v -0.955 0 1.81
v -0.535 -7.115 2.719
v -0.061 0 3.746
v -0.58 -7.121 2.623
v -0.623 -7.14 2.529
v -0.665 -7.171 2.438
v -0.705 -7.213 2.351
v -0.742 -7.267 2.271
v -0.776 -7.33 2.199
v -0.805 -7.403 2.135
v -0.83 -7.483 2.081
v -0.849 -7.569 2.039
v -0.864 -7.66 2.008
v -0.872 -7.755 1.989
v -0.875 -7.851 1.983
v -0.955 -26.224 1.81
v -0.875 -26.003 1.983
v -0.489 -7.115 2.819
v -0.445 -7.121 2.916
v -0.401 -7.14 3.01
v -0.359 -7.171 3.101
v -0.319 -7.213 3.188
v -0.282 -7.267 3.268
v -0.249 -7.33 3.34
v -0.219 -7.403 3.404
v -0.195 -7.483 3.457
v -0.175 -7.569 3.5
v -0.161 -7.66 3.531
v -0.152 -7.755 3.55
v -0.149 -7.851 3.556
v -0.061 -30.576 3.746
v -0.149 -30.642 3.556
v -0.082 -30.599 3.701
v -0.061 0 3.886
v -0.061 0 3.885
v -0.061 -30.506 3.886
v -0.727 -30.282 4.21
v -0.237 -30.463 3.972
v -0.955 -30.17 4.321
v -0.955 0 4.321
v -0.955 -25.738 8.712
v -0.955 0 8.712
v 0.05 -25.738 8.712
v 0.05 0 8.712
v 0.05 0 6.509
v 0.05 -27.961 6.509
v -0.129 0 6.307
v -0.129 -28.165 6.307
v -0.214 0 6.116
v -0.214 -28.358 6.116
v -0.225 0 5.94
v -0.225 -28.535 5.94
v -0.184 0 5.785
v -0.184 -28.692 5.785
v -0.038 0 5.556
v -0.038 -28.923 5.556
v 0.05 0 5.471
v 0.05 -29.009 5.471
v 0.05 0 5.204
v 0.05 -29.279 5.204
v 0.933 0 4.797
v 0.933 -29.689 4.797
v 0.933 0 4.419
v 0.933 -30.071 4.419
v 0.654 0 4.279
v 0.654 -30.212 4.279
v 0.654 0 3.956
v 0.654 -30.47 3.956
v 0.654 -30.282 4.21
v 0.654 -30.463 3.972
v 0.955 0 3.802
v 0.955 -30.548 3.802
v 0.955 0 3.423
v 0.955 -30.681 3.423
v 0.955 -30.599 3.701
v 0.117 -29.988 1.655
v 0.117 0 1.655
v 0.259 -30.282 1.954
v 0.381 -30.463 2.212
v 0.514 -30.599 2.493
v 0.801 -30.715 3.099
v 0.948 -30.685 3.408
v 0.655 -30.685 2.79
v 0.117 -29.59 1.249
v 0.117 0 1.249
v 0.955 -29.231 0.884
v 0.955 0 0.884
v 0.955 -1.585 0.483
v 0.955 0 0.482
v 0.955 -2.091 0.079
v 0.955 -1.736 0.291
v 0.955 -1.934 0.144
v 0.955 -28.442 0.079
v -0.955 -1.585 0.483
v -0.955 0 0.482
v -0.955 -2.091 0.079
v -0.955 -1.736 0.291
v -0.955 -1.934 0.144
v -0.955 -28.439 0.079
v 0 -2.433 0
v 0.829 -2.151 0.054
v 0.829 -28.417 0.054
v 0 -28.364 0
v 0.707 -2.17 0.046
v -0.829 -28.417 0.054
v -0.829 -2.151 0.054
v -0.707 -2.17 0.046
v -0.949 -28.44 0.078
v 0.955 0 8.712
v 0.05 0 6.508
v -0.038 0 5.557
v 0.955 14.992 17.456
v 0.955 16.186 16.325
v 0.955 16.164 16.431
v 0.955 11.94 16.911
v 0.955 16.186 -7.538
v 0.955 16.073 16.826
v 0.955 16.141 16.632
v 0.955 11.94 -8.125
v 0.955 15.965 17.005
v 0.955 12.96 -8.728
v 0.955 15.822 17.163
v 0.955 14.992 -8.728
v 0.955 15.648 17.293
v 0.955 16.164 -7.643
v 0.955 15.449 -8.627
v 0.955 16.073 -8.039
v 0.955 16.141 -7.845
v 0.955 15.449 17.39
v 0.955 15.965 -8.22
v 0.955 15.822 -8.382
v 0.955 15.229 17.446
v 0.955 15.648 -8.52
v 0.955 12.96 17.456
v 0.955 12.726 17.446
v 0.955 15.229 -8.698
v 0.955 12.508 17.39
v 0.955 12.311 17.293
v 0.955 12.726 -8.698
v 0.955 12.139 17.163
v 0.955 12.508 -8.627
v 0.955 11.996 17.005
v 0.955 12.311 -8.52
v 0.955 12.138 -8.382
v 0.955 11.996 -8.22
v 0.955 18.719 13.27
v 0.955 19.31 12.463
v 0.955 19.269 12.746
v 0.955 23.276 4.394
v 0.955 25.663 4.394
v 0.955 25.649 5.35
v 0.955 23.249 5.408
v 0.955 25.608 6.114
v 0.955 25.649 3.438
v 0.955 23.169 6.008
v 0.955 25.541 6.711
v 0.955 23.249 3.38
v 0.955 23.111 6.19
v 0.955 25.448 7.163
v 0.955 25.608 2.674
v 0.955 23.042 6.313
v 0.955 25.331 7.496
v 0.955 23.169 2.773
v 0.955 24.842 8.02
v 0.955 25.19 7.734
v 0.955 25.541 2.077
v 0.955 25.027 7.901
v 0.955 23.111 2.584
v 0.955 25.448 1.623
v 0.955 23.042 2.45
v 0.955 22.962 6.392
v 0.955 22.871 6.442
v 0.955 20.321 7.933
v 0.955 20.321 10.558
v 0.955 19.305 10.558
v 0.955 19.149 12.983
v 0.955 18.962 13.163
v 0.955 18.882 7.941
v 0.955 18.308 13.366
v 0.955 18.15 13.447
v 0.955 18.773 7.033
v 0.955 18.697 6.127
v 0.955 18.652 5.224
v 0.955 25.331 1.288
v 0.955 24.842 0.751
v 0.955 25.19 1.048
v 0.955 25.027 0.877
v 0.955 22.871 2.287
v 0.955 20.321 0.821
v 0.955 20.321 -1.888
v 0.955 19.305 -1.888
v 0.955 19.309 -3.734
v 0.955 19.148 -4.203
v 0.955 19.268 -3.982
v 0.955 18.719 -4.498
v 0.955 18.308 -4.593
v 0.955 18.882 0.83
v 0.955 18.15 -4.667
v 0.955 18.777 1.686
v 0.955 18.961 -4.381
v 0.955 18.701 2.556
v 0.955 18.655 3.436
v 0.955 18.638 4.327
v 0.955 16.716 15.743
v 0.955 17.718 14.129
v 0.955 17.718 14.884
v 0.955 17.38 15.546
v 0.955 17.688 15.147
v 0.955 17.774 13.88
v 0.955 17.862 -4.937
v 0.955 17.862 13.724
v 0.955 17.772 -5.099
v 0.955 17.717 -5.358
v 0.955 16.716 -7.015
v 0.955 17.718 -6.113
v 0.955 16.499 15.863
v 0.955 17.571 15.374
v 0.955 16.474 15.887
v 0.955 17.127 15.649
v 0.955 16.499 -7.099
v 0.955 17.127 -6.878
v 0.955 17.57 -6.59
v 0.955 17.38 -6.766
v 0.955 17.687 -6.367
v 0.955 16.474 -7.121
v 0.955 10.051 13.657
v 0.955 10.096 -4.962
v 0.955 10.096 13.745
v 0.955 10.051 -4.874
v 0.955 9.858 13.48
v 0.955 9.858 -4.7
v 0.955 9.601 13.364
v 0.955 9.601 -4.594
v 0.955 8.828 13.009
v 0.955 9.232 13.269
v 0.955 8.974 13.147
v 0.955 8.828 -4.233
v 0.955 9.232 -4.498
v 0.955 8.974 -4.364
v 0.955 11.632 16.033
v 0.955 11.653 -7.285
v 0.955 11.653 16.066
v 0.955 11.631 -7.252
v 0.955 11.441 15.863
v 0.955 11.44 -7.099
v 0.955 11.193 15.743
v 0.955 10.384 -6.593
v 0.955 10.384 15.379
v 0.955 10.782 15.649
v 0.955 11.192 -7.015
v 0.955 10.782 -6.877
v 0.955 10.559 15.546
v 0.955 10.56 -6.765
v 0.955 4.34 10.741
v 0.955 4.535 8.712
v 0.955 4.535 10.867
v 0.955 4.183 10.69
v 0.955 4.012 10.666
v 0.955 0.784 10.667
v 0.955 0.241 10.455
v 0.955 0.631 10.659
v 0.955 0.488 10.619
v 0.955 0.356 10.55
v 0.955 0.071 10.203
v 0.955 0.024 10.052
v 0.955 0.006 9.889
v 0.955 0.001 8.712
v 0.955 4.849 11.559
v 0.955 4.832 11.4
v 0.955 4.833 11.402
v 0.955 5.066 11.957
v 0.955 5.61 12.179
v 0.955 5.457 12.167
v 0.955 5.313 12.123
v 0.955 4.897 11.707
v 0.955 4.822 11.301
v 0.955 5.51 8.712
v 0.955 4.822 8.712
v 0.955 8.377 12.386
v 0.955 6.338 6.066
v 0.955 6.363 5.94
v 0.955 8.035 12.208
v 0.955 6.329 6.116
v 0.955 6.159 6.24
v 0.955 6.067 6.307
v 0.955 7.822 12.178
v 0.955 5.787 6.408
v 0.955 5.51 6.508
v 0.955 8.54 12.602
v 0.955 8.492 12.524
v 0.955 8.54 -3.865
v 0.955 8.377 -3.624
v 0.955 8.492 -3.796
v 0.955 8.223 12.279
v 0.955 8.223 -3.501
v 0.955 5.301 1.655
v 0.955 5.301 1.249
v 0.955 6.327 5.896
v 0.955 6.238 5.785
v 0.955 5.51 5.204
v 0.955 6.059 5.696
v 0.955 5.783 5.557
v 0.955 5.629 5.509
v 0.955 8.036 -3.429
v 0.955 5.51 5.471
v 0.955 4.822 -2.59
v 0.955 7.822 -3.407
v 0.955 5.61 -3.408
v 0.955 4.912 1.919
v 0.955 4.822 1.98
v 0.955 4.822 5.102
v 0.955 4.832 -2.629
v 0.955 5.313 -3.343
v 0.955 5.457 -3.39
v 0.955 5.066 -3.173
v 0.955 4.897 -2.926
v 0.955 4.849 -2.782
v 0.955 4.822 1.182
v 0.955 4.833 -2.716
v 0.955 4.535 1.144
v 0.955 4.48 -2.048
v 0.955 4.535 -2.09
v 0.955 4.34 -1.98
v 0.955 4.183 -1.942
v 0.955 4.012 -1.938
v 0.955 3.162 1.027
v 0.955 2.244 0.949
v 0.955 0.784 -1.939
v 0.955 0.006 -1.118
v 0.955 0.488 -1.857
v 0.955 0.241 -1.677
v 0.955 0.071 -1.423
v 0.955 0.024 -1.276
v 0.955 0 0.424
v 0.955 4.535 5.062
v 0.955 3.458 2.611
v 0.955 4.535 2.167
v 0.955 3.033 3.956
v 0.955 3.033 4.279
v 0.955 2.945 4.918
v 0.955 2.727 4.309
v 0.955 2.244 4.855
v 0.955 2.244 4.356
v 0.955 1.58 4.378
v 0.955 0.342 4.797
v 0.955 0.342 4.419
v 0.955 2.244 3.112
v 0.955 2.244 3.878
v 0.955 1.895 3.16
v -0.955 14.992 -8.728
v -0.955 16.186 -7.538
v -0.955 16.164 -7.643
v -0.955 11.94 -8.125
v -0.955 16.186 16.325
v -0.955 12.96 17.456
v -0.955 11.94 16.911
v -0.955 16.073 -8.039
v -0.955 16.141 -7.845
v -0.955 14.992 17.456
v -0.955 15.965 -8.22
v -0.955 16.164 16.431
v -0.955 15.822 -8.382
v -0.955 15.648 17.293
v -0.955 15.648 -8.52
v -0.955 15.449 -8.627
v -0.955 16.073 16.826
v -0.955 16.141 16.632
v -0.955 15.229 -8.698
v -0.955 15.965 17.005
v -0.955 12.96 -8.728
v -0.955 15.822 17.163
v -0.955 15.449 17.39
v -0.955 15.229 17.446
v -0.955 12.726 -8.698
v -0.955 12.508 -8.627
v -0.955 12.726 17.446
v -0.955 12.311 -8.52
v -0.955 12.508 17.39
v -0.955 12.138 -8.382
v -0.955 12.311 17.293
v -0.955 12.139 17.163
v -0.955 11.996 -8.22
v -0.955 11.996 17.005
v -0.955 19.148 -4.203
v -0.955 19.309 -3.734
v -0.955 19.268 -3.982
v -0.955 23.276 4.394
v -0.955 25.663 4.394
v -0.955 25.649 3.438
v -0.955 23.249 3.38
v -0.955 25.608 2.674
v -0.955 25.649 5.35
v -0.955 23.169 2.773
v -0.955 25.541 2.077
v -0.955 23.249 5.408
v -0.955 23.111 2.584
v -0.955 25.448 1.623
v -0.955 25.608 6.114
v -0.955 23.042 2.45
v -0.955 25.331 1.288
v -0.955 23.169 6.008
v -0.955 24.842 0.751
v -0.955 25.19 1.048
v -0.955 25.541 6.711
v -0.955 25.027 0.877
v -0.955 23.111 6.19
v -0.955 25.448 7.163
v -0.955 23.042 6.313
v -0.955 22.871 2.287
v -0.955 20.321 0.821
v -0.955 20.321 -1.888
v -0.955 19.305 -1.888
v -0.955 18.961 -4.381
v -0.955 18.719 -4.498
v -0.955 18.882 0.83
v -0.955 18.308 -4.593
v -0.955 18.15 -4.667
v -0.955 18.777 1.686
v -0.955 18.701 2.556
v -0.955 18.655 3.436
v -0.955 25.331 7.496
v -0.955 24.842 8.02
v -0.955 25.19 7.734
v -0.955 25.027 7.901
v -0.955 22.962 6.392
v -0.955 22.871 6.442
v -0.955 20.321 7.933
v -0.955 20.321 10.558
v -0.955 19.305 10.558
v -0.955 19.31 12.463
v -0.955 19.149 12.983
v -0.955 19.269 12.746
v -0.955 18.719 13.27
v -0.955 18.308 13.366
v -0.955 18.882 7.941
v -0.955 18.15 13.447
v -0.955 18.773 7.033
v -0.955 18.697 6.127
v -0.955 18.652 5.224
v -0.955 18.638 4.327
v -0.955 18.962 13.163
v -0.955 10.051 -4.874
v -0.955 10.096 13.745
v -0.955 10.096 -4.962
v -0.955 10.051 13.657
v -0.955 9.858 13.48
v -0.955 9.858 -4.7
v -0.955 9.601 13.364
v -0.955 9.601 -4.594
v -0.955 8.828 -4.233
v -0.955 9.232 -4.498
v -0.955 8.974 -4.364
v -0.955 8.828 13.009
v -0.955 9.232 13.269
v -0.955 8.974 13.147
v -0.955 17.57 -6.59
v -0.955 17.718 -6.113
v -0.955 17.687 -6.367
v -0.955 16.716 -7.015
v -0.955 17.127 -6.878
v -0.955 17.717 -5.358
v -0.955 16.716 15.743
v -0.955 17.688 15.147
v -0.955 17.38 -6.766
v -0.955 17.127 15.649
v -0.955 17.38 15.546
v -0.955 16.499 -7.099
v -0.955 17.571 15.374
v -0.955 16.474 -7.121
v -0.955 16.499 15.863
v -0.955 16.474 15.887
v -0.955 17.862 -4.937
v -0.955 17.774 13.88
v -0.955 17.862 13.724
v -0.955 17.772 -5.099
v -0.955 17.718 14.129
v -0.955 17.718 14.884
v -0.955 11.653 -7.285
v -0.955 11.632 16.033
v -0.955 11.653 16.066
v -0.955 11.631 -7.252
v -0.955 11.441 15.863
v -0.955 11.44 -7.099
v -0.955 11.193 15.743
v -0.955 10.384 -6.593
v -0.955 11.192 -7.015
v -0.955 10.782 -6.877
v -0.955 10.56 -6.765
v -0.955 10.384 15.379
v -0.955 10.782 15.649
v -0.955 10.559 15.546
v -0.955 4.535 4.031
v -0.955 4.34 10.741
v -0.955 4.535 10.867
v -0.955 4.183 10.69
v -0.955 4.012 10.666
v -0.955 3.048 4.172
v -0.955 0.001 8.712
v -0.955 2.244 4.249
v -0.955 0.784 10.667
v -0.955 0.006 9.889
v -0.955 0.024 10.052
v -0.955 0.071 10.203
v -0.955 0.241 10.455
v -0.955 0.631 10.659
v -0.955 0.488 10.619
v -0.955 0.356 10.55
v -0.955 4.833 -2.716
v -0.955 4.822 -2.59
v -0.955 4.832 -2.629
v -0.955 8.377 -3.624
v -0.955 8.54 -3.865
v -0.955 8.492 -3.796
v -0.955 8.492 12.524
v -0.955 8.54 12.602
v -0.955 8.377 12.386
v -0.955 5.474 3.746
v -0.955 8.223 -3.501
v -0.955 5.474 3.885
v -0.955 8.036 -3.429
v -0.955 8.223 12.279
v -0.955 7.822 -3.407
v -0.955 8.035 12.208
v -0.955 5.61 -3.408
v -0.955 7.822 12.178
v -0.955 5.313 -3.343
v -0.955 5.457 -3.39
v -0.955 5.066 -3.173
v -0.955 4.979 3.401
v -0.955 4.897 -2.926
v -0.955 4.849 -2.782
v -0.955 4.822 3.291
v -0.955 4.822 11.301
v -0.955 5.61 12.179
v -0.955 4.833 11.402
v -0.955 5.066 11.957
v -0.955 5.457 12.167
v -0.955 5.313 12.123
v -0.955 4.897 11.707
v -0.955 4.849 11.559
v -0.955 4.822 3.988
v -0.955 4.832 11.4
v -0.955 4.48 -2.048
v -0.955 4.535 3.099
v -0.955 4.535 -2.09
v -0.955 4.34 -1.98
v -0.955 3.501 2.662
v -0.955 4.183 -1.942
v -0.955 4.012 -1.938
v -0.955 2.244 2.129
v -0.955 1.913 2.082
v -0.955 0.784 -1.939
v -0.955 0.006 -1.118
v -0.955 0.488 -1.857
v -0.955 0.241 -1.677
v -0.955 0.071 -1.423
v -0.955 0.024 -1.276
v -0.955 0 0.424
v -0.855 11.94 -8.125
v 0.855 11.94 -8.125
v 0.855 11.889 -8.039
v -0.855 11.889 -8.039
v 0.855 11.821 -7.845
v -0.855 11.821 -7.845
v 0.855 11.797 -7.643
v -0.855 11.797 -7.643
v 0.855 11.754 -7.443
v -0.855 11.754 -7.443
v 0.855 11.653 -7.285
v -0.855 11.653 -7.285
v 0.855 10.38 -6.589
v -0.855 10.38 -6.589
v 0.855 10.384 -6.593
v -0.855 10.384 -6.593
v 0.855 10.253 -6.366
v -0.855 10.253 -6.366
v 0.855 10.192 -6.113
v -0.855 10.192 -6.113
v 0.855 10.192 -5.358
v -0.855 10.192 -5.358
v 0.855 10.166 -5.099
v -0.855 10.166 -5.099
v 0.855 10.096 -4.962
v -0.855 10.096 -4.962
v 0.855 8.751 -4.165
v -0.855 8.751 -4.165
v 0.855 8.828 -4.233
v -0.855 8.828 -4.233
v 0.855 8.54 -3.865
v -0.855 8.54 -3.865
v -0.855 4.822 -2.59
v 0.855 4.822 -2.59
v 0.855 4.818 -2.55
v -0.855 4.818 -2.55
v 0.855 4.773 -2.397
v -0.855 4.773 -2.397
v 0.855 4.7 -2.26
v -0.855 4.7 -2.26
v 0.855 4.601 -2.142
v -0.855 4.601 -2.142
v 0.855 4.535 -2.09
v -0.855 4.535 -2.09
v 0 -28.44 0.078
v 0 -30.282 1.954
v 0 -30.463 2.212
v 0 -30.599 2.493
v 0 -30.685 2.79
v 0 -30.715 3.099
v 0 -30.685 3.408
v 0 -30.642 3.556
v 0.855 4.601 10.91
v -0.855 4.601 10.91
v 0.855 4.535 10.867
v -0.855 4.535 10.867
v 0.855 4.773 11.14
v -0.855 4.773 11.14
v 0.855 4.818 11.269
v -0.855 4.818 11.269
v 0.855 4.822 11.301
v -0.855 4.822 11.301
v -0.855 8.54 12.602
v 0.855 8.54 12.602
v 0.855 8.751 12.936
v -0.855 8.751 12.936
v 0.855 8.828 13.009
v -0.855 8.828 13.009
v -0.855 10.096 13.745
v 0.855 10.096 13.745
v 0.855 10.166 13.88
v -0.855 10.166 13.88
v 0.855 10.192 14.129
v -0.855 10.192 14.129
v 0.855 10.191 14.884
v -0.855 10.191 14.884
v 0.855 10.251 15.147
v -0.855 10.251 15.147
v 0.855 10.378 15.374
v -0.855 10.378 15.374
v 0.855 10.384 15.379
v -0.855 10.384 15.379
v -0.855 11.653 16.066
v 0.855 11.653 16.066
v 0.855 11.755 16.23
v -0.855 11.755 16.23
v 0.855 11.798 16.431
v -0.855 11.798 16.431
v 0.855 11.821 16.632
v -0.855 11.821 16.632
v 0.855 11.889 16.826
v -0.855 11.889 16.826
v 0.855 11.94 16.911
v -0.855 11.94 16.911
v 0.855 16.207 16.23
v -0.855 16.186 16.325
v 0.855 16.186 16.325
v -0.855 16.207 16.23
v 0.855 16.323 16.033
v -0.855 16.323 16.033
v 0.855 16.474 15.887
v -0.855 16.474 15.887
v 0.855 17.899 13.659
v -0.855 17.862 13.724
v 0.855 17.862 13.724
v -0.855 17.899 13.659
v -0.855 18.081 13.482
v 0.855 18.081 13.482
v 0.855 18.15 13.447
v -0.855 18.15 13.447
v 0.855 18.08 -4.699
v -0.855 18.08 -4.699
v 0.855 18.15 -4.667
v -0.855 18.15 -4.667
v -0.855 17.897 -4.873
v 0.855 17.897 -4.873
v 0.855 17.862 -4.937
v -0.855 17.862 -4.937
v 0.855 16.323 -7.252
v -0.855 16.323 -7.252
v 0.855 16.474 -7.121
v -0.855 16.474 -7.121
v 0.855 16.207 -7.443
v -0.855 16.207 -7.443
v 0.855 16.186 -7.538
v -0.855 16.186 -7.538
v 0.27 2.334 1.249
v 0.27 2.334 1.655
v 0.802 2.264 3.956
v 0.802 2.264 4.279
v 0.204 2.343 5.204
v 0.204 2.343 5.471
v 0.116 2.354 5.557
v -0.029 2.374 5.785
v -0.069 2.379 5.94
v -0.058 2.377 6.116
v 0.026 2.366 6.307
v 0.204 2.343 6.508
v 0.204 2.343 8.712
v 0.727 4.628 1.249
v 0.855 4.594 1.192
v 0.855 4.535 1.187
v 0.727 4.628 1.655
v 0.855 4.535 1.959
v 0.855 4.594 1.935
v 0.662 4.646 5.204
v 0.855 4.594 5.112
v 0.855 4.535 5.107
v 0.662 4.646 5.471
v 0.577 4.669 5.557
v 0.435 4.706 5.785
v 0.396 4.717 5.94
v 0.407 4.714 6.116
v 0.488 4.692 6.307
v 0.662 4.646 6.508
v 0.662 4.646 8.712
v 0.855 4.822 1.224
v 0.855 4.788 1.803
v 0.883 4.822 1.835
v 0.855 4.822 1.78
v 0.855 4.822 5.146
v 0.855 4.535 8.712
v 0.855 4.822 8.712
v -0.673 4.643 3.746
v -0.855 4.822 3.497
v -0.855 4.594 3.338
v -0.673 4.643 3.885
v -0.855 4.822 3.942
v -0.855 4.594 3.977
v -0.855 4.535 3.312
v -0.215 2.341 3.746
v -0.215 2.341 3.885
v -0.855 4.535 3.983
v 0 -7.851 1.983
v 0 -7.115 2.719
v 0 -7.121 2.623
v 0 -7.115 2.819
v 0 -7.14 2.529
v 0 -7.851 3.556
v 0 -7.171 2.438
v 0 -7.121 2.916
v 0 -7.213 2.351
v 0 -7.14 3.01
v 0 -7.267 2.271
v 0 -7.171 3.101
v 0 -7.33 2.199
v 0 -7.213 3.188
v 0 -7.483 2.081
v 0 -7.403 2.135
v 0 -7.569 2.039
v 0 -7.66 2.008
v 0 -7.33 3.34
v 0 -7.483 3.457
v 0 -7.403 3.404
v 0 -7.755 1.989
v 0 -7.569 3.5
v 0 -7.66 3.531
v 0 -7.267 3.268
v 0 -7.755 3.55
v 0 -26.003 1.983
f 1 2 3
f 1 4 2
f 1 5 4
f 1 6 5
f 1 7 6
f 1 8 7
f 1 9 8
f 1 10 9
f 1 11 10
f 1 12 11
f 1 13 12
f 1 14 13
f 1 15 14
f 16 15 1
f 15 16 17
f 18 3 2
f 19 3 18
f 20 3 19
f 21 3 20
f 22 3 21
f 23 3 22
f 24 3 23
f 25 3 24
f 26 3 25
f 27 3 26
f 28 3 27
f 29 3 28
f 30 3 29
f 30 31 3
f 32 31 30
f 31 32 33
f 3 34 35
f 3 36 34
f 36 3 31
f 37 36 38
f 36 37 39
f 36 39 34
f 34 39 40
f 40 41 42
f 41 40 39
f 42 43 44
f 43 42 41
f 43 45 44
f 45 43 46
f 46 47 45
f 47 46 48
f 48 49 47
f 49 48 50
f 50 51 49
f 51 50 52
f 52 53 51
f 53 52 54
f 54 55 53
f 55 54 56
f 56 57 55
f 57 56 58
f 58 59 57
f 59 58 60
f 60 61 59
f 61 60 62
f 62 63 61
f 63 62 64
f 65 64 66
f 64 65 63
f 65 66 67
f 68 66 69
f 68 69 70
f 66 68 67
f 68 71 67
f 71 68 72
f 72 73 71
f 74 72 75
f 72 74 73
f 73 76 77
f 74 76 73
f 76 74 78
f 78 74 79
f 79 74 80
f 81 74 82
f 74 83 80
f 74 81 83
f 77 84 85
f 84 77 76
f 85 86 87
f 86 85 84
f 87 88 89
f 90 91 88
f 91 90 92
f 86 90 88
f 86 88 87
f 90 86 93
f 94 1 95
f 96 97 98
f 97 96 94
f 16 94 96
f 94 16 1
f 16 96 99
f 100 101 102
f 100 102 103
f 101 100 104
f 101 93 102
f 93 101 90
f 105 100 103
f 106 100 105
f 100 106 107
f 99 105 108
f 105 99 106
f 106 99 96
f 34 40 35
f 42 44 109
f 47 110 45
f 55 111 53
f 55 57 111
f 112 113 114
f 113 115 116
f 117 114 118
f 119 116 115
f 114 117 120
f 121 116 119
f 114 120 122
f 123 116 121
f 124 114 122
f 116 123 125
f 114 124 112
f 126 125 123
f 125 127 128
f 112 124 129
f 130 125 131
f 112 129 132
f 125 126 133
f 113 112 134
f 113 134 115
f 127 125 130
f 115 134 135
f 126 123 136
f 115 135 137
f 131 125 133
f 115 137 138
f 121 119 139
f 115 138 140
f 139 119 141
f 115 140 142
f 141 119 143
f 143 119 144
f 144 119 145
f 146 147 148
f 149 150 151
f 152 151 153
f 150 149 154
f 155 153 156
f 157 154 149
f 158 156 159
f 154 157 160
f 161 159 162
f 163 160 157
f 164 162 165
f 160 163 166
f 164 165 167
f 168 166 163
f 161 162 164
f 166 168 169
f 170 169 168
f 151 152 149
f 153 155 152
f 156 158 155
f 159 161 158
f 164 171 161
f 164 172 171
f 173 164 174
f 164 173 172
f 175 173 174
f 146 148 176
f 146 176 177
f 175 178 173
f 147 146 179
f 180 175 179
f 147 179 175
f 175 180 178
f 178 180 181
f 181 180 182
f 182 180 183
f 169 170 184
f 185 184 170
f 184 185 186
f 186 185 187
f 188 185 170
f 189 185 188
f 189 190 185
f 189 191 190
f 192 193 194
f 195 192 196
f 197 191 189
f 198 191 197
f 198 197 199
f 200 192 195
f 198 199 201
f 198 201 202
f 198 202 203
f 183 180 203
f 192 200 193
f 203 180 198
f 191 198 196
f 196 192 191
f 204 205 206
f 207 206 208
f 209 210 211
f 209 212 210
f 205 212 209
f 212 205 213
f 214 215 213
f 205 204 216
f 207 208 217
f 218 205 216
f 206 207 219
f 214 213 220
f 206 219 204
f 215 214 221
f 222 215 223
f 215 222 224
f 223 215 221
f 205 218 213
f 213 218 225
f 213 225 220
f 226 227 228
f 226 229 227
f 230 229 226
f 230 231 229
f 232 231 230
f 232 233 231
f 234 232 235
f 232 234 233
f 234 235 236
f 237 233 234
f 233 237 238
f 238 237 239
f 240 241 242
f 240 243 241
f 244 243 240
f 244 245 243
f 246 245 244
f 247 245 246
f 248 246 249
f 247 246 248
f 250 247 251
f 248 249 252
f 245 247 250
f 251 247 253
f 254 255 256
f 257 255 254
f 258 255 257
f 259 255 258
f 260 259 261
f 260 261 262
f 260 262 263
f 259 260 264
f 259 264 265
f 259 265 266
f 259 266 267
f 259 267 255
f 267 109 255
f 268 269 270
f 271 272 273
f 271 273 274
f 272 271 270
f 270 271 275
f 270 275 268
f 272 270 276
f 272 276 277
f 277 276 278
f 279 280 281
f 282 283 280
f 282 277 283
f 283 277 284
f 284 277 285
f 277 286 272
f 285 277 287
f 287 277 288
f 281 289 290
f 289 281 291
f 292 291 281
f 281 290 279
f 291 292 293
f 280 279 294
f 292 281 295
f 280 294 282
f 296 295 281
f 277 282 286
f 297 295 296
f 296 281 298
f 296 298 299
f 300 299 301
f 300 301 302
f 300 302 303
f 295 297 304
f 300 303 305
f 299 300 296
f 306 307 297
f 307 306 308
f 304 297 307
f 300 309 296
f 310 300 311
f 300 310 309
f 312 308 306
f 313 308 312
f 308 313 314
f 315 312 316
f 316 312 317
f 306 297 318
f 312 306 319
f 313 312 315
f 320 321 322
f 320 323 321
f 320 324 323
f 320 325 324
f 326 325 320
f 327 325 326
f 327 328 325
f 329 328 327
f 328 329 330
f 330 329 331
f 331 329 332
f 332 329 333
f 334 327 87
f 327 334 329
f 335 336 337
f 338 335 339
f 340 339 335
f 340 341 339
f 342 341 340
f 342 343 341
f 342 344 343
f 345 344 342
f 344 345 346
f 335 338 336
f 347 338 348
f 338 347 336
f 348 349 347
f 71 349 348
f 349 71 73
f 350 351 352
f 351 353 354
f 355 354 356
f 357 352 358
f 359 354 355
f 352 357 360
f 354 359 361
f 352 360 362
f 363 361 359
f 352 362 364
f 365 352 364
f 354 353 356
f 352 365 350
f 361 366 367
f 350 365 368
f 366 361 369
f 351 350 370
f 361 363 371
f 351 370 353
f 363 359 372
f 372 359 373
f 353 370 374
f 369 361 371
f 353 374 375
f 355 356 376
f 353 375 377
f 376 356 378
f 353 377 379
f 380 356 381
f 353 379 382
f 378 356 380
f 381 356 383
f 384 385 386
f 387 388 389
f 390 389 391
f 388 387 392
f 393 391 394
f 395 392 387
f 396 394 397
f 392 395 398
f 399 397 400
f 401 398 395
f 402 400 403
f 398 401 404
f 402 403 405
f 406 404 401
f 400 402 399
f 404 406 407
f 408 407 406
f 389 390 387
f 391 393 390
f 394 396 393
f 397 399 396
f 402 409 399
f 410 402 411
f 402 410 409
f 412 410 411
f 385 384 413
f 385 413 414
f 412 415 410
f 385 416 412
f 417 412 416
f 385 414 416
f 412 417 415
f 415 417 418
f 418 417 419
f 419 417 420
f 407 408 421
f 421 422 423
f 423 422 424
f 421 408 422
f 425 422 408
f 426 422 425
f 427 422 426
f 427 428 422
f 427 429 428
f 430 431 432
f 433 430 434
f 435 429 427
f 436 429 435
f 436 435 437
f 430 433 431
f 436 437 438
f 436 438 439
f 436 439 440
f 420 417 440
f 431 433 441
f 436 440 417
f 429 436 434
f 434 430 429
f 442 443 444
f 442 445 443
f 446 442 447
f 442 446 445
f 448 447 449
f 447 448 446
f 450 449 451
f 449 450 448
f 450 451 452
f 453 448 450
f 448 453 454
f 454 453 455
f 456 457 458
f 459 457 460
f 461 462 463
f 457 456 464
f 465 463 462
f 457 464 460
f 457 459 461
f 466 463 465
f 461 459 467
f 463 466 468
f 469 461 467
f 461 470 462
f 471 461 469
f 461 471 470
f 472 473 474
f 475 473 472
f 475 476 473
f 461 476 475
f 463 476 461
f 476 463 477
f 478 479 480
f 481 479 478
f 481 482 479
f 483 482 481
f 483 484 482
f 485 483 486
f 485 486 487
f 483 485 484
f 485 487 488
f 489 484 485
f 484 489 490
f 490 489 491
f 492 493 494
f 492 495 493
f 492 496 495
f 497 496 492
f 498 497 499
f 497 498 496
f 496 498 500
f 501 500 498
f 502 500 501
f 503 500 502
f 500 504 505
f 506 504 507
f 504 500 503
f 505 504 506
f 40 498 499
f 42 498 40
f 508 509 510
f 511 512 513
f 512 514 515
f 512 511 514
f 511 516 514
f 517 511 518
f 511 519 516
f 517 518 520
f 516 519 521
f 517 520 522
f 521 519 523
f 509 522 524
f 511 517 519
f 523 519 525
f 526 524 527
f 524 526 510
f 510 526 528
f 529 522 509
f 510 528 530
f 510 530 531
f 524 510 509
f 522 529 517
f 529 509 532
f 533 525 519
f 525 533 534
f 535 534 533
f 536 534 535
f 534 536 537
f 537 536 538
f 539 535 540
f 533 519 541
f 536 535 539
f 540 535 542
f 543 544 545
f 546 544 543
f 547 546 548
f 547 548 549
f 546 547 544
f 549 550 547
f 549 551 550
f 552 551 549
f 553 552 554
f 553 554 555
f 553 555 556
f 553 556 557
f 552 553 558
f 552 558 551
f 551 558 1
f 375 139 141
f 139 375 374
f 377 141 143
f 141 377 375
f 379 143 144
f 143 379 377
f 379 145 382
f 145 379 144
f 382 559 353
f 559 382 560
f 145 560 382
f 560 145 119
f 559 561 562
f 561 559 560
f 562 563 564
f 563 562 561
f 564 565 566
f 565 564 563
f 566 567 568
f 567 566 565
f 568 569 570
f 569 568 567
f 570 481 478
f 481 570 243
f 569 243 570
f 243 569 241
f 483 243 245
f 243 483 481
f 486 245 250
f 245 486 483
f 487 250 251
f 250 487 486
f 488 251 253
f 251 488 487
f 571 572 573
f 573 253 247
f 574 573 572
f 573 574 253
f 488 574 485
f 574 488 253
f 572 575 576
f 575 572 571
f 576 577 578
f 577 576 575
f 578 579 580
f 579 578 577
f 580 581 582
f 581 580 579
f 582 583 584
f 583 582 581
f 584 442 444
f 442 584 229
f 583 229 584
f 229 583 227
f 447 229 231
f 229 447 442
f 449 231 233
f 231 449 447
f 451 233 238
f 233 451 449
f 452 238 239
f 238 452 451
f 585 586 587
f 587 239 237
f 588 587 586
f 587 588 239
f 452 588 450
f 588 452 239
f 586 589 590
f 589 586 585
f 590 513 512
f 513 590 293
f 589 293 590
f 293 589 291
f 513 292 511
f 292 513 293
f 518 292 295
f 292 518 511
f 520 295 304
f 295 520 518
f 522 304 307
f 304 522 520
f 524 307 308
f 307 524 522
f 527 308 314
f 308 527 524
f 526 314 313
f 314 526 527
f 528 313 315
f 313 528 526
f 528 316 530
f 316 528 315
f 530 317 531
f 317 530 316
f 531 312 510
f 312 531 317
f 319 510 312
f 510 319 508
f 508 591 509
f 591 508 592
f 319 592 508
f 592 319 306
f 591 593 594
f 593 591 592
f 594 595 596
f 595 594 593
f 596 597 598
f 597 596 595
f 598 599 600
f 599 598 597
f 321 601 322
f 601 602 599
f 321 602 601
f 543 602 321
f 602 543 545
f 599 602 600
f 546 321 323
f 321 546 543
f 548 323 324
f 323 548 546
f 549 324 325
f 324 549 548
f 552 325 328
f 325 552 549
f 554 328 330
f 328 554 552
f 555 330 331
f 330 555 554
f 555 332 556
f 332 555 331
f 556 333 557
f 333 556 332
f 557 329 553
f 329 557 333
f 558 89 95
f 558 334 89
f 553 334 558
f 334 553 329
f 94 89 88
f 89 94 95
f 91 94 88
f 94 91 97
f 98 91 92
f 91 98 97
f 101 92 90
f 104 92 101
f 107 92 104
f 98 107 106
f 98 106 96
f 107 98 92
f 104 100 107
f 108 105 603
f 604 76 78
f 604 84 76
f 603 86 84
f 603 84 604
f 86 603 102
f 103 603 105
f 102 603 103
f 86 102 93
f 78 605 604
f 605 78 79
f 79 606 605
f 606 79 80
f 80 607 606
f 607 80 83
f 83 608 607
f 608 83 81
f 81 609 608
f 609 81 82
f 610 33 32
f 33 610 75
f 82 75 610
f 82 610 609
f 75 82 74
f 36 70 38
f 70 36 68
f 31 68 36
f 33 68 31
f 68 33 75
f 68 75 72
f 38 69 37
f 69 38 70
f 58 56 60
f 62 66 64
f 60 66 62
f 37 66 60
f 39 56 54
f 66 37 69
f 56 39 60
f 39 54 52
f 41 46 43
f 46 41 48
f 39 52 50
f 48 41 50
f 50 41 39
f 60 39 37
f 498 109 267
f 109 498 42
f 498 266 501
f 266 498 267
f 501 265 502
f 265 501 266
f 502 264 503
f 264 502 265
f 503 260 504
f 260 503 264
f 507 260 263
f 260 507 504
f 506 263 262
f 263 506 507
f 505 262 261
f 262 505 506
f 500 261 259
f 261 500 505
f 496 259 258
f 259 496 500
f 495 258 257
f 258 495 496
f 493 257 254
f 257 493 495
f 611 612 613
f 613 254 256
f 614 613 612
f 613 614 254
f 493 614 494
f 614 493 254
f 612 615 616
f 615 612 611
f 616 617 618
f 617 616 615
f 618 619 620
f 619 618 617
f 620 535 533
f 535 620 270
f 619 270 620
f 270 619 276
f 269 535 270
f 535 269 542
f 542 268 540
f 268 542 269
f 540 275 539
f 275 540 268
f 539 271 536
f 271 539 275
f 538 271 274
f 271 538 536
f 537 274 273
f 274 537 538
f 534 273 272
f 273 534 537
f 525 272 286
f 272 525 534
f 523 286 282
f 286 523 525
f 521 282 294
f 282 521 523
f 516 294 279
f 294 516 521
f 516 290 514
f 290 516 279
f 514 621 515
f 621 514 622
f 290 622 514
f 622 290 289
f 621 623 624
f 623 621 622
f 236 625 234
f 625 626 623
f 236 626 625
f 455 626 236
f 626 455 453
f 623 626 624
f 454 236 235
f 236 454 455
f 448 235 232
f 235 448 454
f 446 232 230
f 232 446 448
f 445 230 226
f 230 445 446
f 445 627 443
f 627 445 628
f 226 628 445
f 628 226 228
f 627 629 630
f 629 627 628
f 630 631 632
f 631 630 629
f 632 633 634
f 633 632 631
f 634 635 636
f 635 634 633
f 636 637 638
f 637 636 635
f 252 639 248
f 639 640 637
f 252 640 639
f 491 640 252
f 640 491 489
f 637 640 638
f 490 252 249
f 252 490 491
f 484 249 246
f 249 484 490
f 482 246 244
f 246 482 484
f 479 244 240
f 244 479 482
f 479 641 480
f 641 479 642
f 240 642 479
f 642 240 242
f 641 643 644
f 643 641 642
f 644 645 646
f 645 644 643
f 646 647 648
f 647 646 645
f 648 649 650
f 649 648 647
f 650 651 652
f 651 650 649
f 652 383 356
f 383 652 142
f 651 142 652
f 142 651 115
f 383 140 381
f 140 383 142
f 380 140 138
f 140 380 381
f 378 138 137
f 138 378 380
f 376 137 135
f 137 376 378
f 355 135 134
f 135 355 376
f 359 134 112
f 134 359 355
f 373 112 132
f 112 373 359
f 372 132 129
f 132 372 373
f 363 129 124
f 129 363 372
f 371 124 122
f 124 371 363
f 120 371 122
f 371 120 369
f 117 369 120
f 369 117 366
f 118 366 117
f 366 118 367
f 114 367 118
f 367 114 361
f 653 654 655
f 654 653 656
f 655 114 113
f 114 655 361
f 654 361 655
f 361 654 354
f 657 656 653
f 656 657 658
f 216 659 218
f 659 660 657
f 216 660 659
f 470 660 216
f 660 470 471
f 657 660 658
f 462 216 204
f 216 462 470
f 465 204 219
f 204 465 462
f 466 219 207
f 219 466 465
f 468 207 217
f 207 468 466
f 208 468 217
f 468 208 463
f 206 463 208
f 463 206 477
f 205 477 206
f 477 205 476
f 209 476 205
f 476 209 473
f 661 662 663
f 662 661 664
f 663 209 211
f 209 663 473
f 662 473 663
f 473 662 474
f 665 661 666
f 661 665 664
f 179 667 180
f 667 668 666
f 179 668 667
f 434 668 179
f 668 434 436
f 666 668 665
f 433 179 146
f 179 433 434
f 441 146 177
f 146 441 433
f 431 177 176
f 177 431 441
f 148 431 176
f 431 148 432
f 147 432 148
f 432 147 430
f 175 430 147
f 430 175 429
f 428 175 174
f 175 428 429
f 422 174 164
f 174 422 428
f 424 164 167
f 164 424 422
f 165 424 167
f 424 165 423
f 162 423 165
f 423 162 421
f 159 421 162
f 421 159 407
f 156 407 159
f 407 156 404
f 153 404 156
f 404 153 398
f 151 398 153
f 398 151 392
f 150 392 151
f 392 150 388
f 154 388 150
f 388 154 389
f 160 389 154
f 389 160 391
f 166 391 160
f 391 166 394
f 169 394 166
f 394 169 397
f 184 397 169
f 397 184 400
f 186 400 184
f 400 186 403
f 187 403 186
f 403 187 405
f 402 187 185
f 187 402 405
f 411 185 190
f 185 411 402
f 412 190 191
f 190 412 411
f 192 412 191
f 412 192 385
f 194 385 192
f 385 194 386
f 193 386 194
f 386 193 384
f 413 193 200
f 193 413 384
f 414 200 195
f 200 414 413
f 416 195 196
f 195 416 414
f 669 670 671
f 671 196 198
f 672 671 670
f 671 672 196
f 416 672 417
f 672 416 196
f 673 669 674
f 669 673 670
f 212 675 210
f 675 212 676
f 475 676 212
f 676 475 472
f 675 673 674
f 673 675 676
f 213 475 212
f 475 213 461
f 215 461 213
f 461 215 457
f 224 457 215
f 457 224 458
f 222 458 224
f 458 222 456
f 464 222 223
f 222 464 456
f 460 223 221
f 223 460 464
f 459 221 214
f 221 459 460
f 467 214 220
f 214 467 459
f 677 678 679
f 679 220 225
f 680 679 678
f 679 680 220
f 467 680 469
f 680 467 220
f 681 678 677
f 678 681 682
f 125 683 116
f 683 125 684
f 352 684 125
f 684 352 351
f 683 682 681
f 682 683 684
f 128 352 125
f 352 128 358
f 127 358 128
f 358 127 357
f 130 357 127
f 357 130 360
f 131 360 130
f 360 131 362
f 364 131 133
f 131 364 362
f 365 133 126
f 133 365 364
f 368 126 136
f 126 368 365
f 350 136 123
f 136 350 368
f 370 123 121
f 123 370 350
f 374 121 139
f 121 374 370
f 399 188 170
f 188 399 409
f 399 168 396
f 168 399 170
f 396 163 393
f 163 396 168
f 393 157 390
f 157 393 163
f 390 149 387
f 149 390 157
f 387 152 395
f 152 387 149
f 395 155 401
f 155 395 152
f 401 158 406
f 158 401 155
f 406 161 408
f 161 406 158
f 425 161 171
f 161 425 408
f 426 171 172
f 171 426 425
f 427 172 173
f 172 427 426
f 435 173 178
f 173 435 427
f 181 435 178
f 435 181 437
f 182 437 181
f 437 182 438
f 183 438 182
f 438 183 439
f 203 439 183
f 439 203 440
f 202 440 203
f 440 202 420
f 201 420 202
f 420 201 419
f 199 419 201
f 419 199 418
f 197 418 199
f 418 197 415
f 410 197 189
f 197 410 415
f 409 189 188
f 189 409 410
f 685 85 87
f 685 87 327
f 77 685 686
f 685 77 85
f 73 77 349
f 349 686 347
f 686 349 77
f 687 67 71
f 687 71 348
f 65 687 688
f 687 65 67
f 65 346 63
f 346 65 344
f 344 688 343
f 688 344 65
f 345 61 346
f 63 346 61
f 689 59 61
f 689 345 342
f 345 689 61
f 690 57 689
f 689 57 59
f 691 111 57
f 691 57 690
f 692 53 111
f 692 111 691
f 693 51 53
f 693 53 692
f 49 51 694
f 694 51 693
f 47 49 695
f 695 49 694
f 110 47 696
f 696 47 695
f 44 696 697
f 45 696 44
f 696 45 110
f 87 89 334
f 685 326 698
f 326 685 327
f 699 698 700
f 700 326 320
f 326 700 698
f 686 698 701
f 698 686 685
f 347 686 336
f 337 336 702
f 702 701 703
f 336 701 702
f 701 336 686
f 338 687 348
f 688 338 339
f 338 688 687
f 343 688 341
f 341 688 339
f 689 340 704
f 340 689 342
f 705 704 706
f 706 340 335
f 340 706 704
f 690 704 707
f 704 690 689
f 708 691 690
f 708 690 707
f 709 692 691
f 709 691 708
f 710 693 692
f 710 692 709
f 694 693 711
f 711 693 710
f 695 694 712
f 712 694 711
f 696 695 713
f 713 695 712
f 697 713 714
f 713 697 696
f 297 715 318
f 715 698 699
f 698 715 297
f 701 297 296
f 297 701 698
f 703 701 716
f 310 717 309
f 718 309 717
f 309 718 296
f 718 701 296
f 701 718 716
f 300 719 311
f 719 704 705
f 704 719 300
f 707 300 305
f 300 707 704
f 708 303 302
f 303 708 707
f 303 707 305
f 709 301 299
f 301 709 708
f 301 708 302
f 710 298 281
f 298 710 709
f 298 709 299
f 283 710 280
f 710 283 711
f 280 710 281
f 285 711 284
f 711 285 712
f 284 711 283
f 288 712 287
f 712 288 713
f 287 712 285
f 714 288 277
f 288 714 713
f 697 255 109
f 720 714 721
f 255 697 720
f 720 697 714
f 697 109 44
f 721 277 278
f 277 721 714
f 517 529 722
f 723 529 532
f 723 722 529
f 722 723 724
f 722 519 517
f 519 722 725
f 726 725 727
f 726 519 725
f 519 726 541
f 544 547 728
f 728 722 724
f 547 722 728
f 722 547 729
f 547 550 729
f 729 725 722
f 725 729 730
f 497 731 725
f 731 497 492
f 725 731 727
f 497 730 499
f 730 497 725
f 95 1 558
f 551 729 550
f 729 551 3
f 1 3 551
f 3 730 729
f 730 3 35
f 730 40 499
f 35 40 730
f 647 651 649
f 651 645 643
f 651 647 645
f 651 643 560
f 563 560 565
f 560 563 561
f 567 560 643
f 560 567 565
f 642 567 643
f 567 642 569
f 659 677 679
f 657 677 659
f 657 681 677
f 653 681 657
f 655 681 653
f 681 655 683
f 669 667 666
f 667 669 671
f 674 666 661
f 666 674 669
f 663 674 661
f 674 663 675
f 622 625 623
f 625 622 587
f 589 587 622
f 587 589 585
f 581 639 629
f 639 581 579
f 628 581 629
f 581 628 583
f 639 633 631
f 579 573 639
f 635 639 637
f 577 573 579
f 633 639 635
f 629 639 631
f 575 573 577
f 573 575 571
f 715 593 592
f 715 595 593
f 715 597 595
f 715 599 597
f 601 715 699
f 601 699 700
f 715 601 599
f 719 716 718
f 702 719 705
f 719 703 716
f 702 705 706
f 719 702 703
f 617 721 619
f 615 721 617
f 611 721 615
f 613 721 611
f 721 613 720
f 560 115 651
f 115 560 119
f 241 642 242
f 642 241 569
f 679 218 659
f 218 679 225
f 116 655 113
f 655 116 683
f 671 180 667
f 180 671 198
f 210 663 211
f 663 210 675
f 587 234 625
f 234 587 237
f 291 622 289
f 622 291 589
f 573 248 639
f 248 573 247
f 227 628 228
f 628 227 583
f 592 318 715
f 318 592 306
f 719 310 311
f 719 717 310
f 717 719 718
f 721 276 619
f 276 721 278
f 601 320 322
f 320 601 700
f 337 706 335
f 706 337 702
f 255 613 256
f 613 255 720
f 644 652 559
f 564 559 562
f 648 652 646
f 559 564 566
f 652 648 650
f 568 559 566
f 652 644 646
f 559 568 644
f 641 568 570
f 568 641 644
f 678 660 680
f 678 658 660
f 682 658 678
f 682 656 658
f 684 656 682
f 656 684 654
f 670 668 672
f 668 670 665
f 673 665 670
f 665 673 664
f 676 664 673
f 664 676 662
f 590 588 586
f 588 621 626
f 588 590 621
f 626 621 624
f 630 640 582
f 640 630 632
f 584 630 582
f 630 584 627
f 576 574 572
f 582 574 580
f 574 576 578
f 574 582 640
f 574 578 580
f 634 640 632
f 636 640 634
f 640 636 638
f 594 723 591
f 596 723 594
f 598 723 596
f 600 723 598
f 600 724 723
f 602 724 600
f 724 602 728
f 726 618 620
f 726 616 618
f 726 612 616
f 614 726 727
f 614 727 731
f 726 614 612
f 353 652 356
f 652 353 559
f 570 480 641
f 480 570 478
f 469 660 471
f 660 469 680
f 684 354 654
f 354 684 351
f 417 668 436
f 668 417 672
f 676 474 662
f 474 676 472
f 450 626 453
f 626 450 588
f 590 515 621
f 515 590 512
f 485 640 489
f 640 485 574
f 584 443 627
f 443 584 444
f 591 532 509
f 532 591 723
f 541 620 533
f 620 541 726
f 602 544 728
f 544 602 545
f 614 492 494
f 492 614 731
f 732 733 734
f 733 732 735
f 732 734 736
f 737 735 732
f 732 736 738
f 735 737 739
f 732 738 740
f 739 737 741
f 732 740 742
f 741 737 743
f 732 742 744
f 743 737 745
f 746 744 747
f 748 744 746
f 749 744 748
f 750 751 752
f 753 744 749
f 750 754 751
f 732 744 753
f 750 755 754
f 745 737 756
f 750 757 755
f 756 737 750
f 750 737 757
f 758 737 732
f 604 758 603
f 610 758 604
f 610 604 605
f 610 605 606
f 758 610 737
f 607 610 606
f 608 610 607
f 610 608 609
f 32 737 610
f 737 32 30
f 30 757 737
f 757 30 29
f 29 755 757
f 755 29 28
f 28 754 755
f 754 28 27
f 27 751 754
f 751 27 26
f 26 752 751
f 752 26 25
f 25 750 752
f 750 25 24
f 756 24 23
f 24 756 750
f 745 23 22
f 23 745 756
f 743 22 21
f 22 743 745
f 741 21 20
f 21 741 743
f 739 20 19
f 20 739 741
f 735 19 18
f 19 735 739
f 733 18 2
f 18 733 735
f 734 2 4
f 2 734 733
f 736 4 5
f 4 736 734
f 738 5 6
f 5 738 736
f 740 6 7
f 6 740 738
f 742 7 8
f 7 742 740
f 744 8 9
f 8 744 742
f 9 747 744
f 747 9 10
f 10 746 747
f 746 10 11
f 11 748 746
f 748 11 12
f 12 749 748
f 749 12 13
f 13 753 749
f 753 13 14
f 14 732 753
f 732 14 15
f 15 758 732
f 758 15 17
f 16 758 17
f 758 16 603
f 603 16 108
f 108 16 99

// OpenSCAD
use <keygen.scad>
include <gen/schlage.gen.scad>

module side_bit_milling(cut_locations, bitting="") {
    sbm_cut_locations = [for(i=[0:len(cut_locations)-2]) 0.5 * (cut_locations[i] + cut_locations[i+1])];
    
    sbm_offsets_mil = [[], [-32, 48], [-32, 24], [0, 60], [0, 36], [32, 48], [32, 24]];
    sbm_offsets = [for(p=sbm_offsets_mil) [for(e=p) e * 0.0254]];
    sbm_angle = 120;
    sbm_max_height = 140 * 0.0254;
    sbm_cutter_radius= 29 * 0.0254;
    sbm_dist = 5;
    sbm_eps = 0.1;
    sbm_on_ramp = 29;

    heights = key_code_to_heights(bitting, sbm_offsets);

    rotate(-90, [0, 1, 0]) rotate(-90, [0, 0, 1])
        linear_extrude(height=sbm_dist)
            minkowski() {
                union() {
                    for(i=key_enum(heights)) {
                        translate([sbm_cut_locations[i], 0])
                            polygon([[heights[i][0], heights[i][1] + sbm_cutter_radius],
                                    [tan(0.5 * sbm_angle) * (sbm_max_height-heights[i][1]-2*sbm_cutter_radius), sbm_max_height - sbm_cutter_radius],
                                    [-tan(0.5 * sbm_angle) * (sbm_max_height-heights[i][1]-2*sbm_cutter_radius), sbm_max_height - sbm_cutter_radius]]);
                    }
                    translate([sbm_on_ramp + sbm_cutter_radius, 0])
                        polygon([[0, 0],
                                 [tan(0.5 * sbm_angle) * (sbm_max_height-2*sbm_cutter_radius), sbm_max_height - sbm_cutter_radius],
                                 [-tan(0.5 * sbm_angle) * (sbm_max_height-2*sbm_cutter_radius), sbm_max_height - sbm_cutter_radius]]);
                    polygon([[sbm_cut_locations[0], sbm_max_height - sbm_cutter_radius],
                              [sbm_on_ramp, sbm_max_height - sbm_cutter_radius],
                              [sbm_on_ramp, sbm_max_height - sbm_cutter_radius - sbm_eps],
                              [sbm_cut_locations[0], sbm_max_height - sbm_cutter_radius - sbm_eps]]);
                }
                circle(r=sbm_cutter_radius, center=true, $fn=$fn ? 4*$fn : 48);
            }
}

module schlage_primus(bitting="",
                      outline_name="6-pin",
                      warding_name="CP") {

    name = "Schlage Primus Classic";

    /*
        Bitting is specified from bow to tip, 0-9, with 0 being the shallowest cut and 9 being the deepest.

        Then, side-bit milling is specified from bow to tip, 1-6.

        A dash separates the two.

        Example: 253636-24436
    */

    // TODO is 5-pin primus a thing??

    outlines_k = ["6-pin"];
    outlines_v = [[outline_6pin_points, outline_6pin_paths,
                   [-outline_6pin_points[92][0], -outline_6pin_points[98][1]],
                   engrave_6pin_points,
                   engrave_6pin_paths]];

    // TODO add primus keyways

    wardings_k = ["CP",
                  "CEP",
                  "EP",
                  "EFP",
                  "FP",
                  "FGP",
                  "HP",
                  "JP",
                  "LP"];
    wardings_v = [warding_cp_points,
                  warding_cep_points,
                  warding_ep_points,
                  warding_efp_points,
                  warding_fp_points,
                  warding_fgp_points,
                  warding_hp_points,
                  warding_jp_points,
                  warding_lp_points];

    outline_param = key_lkup(outlines_k, outlines_v, outline_name);
    outline_points = outline_param[0];
    outline_paths = outline_param[1];
    offset = outline_param[2];
    engrave_points = outline_param[3];
    engrave_paths = outline_param[4];

    warding_points = key_lkup(wardings_k, wardings_v, warding_name);
    
    cut_locations = [for(i=[.231, .3872, .5434, .6996, .8558, 1.012]) i*25.4];
    depth_table = [for(i=[0.335:-0.015:0.199]) i*25.4];

    bitting_list = key_split_on_dash(bitting);
    top_bitting = bitting_list[0];
    side_bitting = len(bitting_list) > 1 ? bitting_list[1] : "";

    heights = key_code_to_heights(top_bitting, depth_table);


    difference() {
        if($children == 0) {
            key_blank(outline_points,
                      warding_points,
                      outline_paths=outline_paths,
                      engrave_right_points=engrave_points,
                      engrave_right_paths=engrave_paths,
                      engrave_left_points=engrave_points,
                      engrave_left_paths=engrave_paths,
                      offset=offset,
                      plug_diameter=12.7);
        } else {
            children(0);
        }
        key_bitting(heights, cut_locations, .7874);
        side_bit_milling(cut_locations, side_bitting);
    }
}

// Defaults
bitting="";
outline="6-pin";
warding="CP";
schlage_primus(bitting, outline, warding);
